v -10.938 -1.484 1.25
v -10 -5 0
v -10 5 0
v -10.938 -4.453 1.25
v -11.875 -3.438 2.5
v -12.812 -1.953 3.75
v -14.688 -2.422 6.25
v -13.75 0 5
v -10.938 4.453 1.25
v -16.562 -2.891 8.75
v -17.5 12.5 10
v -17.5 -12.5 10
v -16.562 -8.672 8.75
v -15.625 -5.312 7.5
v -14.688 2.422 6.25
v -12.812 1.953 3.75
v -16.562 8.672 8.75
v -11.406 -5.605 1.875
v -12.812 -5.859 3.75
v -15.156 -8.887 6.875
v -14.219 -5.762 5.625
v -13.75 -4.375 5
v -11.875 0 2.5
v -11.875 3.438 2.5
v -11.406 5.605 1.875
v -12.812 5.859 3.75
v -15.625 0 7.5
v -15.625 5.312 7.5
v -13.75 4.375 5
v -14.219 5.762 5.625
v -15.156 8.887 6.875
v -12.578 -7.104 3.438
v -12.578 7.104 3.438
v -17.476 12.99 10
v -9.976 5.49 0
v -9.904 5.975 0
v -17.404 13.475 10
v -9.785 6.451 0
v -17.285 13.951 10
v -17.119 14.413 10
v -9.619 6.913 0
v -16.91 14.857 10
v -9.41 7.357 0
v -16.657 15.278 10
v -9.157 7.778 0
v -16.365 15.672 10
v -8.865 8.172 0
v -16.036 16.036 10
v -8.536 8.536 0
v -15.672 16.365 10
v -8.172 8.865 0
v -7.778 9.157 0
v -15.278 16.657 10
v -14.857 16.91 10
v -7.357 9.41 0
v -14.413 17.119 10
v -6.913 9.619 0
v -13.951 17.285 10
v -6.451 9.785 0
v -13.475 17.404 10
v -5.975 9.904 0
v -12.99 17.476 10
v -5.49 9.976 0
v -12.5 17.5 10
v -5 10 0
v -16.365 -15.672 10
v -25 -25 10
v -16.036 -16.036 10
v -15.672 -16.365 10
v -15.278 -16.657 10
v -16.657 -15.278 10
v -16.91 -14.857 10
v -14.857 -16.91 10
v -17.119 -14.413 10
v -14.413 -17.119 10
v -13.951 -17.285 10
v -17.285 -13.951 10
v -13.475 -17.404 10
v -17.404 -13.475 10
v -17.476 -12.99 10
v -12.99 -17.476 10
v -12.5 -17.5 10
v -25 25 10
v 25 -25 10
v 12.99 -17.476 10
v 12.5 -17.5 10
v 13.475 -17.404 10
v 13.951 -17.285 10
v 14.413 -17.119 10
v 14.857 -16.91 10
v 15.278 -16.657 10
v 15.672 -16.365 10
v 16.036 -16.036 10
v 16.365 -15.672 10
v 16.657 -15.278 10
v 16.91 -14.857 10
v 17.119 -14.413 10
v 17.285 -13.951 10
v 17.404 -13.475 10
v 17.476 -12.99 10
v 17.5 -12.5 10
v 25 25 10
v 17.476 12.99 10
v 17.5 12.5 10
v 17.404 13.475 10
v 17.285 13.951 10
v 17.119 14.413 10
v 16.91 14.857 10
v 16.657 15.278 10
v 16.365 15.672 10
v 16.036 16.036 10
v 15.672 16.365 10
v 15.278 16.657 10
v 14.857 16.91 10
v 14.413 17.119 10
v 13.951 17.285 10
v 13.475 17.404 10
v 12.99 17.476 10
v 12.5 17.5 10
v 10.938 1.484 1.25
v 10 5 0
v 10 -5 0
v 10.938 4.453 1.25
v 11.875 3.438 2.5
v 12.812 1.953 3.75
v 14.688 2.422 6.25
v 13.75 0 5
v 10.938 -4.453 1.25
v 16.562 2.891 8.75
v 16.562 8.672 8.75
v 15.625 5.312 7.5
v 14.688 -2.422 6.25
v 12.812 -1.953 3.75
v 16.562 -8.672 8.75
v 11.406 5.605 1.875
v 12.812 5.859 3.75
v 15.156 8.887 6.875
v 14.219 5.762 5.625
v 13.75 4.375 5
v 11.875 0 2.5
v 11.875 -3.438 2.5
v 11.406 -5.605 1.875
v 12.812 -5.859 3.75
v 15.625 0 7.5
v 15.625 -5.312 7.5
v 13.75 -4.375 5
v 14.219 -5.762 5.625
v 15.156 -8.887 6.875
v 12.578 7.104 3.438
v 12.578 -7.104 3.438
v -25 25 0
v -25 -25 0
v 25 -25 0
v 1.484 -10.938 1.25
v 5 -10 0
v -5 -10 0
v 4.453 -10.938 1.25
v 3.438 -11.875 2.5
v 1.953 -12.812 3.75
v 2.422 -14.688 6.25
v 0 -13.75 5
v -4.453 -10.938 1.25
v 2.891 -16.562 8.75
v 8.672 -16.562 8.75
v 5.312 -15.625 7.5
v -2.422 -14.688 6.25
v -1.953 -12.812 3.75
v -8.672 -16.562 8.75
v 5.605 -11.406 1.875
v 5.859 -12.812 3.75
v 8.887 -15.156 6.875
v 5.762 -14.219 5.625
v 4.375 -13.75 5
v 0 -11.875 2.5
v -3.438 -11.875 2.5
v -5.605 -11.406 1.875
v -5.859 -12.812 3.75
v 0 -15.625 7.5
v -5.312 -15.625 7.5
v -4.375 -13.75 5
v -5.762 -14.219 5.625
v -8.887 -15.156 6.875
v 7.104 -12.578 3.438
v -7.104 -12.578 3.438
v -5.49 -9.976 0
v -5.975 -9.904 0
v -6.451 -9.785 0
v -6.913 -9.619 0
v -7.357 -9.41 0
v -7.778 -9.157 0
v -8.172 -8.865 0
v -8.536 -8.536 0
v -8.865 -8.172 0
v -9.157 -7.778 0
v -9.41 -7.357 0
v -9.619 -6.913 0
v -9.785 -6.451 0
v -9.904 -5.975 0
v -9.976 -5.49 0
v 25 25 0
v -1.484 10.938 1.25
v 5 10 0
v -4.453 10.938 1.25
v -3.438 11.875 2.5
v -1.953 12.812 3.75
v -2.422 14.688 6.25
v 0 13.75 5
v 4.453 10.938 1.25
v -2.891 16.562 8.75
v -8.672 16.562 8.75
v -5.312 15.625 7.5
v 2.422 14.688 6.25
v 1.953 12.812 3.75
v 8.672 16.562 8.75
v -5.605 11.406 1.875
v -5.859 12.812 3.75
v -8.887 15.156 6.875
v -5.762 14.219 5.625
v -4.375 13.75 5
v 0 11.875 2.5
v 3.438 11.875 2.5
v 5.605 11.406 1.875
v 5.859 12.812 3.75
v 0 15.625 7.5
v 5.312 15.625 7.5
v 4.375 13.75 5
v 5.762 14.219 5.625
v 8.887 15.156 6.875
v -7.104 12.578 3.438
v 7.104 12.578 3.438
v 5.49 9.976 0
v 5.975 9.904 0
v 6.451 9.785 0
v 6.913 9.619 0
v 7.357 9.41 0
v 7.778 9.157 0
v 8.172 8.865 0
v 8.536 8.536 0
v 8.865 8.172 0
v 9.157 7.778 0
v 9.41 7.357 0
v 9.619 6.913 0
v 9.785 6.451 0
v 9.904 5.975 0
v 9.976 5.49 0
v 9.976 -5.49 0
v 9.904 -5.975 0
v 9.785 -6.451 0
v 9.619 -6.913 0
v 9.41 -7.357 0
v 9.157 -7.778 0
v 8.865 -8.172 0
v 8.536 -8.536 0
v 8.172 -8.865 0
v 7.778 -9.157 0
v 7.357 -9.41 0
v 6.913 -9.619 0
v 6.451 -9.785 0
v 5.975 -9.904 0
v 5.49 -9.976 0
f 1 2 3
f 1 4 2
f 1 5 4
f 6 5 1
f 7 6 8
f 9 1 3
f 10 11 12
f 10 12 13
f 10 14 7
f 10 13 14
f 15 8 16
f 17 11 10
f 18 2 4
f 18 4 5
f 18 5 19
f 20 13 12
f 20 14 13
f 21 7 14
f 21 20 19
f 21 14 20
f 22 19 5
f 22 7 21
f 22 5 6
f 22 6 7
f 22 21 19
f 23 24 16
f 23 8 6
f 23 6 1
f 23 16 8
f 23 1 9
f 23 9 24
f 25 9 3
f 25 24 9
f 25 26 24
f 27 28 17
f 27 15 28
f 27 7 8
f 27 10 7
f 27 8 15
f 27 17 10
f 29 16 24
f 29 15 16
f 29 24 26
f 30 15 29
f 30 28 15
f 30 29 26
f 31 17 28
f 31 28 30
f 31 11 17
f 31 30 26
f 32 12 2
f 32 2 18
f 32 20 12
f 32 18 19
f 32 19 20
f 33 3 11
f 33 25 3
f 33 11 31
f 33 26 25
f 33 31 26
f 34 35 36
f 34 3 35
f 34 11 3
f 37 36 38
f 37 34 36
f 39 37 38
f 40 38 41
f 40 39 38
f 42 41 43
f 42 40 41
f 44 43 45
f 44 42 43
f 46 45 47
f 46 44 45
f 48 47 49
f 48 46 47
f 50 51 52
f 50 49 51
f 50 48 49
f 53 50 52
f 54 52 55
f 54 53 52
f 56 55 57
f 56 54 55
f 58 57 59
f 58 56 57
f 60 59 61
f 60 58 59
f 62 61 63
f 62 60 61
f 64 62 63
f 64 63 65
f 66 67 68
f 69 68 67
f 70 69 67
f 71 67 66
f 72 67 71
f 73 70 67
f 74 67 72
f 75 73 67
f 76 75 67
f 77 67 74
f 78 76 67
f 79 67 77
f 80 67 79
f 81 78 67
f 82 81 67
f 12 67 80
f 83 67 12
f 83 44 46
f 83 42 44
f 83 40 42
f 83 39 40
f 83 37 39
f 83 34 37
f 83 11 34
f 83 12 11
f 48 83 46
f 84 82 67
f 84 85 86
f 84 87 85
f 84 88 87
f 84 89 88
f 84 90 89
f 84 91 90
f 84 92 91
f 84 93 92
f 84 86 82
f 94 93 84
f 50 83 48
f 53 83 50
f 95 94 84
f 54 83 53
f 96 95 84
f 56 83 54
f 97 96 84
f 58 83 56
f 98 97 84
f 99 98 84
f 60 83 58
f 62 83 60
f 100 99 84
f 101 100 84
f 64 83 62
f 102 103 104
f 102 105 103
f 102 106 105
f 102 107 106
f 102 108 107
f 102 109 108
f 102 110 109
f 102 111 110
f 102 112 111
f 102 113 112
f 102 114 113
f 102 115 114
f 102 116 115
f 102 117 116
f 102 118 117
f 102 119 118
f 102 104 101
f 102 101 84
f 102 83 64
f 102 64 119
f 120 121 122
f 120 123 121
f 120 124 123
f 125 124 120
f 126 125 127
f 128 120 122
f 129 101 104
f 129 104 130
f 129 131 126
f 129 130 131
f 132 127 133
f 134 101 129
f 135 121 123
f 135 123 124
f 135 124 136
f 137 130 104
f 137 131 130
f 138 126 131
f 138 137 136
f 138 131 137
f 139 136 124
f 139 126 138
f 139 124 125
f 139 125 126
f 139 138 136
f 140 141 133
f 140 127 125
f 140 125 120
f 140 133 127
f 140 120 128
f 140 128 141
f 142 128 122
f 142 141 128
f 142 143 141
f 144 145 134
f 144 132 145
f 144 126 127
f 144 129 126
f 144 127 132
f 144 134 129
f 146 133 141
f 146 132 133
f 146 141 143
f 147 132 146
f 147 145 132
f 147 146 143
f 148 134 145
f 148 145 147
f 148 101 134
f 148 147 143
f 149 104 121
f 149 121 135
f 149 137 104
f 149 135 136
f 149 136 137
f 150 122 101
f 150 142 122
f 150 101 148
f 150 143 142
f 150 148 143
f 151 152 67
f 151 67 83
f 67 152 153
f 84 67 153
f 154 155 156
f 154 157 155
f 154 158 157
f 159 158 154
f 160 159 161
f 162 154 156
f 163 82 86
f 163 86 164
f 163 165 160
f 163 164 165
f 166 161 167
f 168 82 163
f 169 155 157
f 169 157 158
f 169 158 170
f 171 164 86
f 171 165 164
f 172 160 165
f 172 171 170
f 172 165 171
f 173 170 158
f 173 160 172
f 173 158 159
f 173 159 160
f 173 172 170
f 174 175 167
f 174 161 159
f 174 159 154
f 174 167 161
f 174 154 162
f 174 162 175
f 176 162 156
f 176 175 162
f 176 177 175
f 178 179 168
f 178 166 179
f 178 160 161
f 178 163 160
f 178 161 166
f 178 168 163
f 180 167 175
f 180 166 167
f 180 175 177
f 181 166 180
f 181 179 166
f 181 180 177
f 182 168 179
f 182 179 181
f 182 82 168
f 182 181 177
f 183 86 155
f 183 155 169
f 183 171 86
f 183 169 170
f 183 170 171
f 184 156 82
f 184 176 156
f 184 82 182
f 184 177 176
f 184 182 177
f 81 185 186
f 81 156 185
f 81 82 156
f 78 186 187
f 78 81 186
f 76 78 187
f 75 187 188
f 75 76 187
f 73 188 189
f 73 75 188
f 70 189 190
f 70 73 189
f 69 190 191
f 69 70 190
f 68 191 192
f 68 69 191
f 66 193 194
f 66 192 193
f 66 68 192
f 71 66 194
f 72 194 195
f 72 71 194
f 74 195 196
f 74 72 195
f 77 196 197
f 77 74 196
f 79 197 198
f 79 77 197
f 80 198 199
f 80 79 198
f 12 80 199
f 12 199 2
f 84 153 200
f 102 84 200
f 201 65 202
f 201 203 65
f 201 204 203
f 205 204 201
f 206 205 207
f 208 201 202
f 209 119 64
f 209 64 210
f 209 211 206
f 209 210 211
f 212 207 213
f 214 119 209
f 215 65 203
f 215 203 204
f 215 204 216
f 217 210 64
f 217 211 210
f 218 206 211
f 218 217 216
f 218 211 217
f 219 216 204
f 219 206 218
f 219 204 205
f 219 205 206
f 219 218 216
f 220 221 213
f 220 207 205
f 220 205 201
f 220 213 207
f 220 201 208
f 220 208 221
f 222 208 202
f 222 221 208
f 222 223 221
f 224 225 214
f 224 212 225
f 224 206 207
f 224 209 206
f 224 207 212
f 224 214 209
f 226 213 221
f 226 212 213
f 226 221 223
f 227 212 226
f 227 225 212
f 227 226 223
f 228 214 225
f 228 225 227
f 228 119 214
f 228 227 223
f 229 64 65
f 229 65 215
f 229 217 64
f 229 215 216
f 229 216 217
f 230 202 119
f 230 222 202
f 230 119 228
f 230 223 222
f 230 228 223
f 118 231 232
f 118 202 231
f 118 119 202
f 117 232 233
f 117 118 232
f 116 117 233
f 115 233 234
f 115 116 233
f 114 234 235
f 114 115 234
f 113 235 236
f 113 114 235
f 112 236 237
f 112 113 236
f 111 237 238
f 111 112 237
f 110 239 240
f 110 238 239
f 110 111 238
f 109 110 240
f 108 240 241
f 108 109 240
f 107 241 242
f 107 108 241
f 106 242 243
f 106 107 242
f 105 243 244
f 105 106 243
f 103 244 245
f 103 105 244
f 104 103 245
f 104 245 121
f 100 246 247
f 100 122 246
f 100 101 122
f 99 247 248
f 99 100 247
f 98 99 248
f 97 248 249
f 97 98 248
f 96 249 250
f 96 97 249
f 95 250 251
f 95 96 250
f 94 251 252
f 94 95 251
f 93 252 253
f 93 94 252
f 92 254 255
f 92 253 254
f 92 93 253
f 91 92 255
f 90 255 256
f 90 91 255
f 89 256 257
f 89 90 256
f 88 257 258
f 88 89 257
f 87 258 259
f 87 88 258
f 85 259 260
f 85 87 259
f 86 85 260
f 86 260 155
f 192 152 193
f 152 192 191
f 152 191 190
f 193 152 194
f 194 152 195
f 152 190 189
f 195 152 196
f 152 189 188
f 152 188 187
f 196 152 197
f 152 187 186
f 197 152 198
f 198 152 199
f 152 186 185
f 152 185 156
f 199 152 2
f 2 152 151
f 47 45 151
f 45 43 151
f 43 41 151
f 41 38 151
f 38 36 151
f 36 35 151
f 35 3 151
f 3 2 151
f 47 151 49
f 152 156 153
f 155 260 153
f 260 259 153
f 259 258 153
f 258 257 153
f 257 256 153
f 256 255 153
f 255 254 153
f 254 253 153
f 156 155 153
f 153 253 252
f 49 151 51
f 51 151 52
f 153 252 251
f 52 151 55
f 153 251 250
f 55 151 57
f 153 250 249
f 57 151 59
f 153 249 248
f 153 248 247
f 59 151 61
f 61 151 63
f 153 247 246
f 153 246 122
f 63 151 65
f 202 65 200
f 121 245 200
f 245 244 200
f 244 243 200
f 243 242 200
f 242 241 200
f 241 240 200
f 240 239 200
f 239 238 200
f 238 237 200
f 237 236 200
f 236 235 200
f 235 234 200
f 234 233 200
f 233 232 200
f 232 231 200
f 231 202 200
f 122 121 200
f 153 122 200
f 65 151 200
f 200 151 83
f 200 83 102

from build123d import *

# Parameters (mm, degrees)
BOX_W     = 50
BOX_H     = 50
BOX_DEPTH = 10


with BuildPart() as loft_body:
    # Sketch (on Face5 of Box) → Loft section 0
    with BuildSketch(Plane.XY):
        with BuildLine():
            Line((-5, 10), (5, 10))
            ThreePointArc((10, 5), (8.535534, 8.535534), (5, 10))
            Line((10, 5), (10, -5))
            ThreePointArc((5, -10), (8.535534, -8.535534), (10, -5))
            Line((5, -10), (-5, -10))
            ThreePointArc((-10, -5), (-8.535534, -8.535534), (-5, -10))
            Line((-10, -5), (-10, 5))
            ThreePointArc((-5, 10), (-8.535534, 8.535534), (-10, 5))
        make_face()
    # Sketch001 (on Face5 of Box) → Loft section 1
    with BuildSketch(Plane.XY.offset(10)):
        with BuildLine():
            Line((-12.5, 17.5), (12.5, 17.5))
            ThreePointArc((17.5, 12.5), (16.035534, 16.035534), (12.5, 17.5))
            Line((17.5, 12.5), (17.5, -12.5))
            ThreePointArc((12.5, -17.5), (16.035534, -16.035534), (17.5, -12.5))
            Line((12.5, -17.5), (-12.5, -17.5))
            ThreePointArc((-17.5, -12.5), (-16.035534, -16.035534), (-12.5, -17.5))
            Line((-17.5, -12.5), (-17.5, 12.5))
            ThreePointArc((-12.5, 17.5), (-16.035534, 16.035534), (-17.5, 12.5))
        make_face()
    loft()


with BuildPart() as cut:
    # Box → Box (new body)
    with BuildSketch(Plane(origin=(-25, -25, 0), x_dir=(1, 0, 0), z_dir=(0, 0, 1))):
        with Locations((25, 25)):
            Rectangle(BOX_W, BOX_H)
    extrude(amount=BOX_DEPTH)

    # Cut: cut Loft body
    add(loft_body.part, mode=Mode.SUBTRACT)


solid = cut.part
